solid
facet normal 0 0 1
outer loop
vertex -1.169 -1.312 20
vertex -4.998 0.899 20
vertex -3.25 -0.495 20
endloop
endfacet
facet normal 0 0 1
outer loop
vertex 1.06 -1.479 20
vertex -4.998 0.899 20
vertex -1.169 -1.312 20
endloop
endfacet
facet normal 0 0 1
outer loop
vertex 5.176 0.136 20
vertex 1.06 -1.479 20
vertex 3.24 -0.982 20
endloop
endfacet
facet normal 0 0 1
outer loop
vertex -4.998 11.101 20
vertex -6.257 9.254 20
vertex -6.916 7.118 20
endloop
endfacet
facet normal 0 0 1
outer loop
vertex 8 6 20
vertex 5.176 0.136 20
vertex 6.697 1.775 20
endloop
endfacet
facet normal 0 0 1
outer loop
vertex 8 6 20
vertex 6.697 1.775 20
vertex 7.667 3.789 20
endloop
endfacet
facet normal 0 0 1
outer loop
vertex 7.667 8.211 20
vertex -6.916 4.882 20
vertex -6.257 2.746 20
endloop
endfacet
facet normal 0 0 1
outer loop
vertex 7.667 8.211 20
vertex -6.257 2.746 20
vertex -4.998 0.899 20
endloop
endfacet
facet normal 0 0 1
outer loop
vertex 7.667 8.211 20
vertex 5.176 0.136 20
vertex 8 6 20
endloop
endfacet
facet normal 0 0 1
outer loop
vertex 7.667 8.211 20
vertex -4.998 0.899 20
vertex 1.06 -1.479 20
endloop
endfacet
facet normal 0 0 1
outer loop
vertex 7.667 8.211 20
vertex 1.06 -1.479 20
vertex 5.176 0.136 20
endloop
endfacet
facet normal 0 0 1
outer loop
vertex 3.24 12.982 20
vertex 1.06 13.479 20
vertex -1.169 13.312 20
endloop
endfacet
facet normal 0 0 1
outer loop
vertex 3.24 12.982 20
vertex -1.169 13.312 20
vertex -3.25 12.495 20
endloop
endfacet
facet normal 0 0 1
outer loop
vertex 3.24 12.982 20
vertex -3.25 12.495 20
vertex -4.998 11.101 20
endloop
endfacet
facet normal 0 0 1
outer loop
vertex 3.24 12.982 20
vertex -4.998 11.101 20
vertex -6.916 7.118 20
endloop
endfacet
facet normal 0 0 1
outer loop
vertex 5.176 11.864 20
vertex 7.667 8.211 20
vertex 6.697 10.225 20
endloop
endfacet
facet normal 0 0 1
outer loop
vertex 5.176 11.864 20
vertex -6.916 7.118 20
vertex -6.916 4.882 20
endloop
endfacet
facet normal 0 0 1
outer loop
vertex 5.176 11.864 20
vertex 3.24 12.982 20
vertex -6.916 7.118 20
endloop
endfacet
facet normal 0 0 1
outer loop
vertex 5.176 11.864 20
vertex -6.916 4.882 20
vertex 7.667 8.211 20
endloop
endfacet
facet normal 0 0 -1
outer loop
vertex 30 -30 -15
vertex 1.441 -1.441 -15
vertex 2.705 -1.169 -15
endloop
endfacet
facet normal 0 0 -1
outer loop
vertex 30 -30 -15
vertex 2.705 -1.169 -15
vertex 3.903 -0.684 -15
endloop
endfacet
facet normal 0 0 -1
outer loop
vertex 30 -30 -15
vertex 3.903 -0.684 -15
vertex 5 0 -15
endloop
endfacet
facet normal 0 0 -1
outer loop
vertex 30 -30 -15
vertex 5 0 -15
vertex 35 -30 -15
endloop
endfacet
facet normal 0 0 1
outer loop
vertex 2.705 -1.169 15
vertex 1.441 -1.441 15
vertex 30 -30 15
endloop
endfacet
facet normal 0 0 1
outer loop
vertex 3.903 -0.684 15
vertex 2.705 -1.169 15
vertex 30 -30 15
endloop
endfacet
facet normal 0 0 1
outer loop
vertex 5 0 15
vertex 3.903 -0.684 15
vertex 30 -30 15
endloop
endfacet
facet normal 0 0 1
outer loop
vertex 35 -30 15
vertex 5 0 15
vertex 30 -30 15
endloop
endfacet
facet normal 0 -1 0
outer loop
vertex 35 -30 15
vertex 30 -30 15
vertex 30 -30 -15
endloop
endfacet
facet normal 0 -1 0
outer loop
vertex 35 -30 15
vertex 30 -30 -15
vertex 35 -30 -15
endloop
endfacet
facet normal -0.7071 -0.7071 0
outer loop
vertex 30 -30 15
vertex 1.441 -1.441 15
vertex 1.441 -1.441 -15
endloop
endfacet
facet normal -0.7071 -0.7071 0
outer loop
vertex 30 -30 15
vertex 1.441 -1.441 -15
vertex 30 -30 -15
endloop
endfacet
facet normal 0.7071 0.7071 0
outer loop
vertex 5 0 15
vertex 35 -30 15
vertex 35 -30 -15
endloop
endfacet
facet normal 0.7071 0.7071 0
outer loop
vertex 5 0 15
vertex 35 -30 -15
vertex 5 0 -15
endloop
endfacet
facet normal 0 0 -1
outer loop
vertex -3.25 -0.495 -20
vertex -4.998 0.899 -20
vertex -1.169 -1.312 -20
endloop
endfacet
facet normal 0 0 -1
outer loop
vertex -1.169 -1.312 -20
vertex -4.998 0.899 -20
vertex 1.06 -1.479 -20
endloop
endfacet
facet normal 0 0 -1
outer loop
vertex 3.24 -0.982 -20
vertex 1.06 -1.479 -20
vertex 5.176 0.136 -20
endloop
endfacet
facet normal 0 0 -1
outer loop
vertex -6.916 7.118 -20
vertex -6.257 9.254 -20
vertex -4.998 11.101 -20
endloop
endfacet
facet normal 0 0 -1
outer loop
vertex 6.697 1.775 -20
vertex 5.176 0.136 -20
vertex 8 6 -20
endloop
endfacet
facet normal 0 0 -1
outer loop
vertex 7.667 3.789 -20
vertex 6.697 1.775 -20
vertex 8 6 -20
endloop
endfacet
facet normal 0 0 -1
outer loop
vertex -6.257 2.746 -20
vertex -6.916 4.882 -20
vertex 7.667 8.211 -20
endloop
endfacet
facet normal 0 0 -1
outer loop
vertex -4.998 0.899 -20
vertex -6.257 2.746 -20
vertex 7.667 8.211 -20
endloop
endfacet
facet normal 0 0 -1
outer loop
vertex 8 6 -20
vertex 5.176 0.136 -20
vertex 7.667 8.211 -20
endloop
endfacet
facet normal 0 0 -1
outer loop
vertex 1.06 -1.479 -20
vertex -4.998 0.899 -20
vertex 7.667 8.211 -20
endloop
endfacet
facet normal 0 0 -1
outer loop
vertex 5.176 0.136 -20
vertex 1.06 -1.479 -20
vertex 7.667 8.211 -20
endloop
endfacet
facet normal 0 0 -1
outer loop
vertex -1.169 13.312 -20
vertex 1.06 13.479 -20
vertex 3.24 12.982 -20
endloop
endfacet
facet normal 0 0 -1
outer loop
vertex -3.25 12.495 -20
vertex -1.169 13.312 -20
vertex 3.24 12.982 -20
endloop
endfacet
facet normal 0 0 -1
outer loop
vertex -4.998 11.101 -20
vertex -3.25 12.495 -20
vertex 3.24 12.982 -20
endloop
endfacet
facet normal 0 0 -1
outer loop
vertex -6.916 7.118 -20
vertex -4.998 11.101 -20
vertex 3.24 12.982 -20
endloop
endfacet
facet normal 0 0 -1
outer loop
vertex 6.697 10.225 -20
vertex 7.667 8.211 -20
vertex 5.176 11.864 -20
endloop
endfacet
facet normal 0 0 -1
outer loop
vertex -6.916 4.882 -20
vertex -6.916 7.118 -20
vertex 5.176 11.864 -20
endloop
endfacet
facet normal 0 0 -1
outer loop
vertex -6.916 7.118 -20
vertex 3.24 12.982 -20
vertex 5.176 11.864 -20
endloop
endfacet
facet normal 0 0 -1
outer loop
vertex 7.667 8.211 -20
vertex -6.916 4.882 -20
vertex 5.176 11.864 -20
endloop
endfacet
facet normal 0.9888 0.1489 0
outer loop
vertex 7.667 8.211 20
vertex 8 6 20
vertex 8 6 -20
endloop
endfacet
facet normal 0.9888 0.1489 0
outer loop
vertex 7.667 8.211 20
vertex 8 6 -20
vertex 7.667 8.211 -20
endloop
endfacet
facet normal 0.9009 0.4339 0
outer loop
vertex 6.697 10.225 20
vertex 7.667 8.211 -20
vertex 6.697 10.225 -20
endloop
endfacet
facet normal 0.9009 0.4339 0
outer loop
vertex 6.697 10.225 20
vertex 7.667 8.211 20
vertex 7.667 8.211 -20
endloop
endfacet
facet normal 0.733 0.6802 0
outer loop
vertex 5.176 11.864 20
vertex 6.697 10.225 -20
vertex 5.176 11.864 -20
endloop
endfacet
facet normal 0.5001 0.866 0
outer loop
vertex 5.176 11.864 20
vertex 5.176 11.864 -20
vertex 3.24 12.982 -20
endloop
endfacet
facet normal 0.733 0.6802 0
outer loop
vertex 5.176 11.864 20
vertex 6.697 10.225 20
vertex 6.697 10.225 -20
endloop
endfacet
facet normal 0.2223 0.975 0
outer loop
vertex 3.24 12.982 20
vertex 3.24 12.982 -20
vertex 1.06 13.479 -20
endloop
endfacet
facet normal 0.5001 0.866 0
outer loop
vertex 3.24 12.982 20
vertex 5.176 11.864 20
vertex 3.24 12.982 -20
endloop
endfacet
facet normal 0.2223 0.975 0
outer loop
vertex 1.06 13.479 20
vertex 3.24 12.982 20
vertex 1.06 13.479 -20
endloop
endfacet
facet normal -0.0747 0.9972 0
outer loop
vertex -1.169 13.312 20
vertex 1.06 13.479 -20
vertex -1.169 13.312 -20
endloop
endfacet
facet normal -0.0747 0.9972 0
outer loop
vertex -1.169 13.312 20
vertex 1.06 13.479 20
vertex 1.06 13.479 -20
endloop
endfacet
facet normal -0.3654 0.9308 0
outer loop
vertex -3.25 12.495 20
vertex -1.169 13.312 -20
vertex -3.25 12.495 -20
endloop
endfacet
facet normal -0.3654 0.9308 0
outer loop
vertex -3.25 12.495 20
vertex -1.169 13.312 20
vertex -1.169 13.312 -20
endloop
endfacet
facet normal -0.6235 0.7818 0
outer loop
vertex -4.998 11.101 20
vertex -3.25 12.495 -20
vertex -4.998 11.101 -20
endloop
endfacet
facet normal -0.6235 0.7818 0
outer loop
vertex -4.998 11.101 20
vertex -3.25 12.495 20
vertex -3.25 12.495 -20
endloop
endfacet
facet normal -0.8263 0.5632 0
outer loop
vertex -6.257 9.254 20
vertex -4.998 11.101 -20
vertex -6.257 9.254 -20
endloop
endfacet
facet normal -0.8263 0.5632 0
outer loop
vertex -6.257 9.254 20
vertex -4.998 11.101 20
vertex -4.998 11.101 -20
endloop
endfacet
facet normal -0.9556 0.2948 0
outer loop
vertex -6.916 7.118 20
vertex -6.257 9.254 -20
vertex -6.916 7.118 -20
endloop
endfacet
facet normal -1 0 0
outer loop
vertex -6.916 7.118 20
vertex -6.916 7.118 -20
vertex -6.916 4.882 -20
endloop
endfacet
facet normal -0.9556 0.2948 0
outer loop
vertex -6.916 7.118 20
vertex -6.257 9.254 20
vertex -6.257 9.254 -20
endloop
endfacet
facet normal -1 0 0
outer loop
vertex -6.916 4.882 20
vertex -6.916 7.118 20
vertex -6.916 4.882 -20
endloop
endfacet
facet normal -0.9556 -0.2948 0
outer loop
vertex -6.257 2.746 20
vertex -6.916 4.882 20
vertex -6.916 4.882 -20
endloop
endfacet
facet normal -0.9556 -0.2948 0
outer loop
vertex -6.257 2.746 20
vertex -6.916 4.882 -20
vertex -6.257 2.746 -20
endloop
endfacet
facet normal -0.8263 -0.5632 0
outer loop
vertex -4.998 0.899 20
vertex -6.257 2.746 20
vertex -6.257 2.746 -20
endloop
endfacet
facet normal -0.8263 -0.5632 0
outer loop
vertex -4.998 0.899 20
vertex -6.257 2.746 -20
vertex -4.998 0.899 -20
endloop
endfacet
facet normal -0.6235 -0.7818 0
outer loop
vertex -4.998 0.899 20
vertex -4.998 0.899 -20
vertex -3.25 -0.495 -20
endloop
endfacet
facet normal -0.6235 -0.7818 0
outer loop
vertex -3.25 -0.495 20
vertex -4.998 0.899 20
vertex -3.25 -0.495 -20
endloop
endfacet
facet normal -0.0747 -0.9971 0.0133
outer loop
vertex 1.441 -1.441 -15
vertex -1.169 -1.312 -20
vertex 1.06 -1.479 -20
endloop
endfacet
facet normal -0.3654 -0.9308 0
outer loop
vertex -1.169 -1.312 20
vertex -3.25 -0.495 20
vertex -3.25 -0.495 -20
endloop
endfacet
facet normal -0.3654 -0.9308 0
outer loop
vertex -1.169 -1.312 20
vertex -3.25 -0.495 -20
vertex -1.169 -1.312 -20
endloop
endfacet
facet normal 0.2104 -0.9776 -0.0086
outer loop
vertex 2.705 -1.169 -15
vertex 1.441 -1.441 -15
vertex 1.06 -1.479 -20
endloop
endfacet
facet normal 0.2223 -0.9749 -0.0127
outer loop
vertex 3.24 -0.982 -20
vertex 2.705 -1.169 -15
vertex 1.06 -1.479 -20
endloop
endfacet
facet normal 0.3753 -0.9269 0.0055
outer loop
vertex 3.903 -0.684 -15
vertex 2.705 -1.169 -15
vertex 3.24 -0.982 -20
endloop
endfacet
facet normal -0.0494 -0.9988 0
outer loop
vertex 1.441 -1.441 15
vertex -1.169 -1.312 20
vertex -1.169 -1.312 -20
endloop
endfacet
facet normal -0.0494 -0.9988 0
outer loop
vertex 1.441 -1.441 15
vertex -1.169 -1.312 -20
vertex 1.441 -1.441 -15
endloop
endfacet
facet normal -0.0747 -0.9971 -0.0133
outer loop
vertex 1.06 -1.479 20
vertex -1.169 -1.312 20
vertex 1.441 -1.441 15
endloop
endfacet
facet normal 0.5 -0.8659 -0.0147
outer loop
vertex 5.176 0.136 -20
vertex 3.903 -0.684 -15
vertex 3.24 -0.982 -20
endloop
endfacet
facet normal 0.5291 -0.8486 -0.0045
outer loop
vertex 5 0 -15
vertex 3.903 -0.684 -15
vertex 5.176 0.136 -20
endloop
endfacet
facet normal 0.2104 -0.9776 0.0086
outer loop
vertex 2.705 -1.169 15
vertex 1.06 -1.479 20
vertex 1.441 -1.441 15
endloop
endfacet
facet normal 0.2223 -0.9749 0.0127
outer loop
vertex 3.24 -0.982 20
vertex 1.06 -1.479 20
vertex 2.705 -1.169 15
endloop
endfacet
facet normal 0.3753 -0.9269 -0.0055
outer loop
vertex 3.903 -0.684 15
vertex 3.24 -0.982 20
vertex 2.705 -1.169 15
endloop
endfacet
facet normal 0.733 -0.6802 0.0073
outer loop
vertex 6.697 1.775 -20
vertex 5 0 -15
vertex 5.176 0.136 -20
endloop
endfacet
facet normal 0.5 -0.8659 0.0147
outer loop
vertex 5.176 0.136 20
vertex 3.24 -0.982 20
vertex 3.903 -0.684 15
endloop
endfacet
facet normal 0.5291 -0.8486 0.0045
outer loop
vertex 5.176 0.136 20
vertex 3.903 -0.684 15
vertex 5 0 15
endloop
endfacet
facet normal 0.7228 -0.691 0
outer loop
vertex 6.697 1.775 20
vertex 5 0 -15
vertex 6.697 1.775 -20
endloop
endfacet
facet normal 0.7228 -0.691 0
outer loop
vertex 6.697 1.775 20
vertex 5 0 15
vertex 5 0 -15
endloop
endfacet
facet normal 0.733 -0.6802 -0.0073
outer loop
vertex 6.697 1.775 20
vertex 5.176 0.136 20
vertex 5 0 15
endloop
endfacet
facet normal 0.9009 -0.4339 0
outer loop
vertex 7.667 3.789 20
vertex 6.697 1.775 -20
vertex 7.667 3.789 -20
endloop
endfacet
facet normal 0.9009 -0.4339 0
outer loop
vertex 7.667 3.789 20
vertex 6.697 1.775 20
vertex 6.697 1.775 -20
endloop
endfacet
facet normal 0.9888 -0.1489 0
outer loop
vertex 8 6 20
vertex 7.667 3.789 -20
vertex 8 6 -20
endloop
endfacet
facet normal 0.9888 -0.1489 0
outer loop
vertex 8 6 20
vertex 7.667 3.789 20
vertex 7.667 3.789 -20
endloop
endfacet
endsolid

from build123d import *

# Parameters (mm, degrees)
BOSS_EXTRUDE2_DEPTH = 15
SKETCH3_3_R         = 7.5
BOSS_EXTRUDE3_DEPTH = 20


with BuildPart() as part:
    # Sketch3 → Boss-Extrude2 (new body, symmetric)
    with BuildSketch(Plane.XY):
        Polygon((0, 0), (30, -30), (35, -30), (5, 0), align=None)
    extrude(amount=BOSS_EXTRUDE2_DEPTH, both=True)

    # Sketch3<3> → Boss-Extrude3 (add, symmetric)
    with BuildSketch(Plane.XY):
        with Locations((0.5, 6)):
            Circle(SKETCH3_3_R)
    extrude(amount=BOSS_EXTRUDE3_DEPTH, both=True)


solid = part.part
